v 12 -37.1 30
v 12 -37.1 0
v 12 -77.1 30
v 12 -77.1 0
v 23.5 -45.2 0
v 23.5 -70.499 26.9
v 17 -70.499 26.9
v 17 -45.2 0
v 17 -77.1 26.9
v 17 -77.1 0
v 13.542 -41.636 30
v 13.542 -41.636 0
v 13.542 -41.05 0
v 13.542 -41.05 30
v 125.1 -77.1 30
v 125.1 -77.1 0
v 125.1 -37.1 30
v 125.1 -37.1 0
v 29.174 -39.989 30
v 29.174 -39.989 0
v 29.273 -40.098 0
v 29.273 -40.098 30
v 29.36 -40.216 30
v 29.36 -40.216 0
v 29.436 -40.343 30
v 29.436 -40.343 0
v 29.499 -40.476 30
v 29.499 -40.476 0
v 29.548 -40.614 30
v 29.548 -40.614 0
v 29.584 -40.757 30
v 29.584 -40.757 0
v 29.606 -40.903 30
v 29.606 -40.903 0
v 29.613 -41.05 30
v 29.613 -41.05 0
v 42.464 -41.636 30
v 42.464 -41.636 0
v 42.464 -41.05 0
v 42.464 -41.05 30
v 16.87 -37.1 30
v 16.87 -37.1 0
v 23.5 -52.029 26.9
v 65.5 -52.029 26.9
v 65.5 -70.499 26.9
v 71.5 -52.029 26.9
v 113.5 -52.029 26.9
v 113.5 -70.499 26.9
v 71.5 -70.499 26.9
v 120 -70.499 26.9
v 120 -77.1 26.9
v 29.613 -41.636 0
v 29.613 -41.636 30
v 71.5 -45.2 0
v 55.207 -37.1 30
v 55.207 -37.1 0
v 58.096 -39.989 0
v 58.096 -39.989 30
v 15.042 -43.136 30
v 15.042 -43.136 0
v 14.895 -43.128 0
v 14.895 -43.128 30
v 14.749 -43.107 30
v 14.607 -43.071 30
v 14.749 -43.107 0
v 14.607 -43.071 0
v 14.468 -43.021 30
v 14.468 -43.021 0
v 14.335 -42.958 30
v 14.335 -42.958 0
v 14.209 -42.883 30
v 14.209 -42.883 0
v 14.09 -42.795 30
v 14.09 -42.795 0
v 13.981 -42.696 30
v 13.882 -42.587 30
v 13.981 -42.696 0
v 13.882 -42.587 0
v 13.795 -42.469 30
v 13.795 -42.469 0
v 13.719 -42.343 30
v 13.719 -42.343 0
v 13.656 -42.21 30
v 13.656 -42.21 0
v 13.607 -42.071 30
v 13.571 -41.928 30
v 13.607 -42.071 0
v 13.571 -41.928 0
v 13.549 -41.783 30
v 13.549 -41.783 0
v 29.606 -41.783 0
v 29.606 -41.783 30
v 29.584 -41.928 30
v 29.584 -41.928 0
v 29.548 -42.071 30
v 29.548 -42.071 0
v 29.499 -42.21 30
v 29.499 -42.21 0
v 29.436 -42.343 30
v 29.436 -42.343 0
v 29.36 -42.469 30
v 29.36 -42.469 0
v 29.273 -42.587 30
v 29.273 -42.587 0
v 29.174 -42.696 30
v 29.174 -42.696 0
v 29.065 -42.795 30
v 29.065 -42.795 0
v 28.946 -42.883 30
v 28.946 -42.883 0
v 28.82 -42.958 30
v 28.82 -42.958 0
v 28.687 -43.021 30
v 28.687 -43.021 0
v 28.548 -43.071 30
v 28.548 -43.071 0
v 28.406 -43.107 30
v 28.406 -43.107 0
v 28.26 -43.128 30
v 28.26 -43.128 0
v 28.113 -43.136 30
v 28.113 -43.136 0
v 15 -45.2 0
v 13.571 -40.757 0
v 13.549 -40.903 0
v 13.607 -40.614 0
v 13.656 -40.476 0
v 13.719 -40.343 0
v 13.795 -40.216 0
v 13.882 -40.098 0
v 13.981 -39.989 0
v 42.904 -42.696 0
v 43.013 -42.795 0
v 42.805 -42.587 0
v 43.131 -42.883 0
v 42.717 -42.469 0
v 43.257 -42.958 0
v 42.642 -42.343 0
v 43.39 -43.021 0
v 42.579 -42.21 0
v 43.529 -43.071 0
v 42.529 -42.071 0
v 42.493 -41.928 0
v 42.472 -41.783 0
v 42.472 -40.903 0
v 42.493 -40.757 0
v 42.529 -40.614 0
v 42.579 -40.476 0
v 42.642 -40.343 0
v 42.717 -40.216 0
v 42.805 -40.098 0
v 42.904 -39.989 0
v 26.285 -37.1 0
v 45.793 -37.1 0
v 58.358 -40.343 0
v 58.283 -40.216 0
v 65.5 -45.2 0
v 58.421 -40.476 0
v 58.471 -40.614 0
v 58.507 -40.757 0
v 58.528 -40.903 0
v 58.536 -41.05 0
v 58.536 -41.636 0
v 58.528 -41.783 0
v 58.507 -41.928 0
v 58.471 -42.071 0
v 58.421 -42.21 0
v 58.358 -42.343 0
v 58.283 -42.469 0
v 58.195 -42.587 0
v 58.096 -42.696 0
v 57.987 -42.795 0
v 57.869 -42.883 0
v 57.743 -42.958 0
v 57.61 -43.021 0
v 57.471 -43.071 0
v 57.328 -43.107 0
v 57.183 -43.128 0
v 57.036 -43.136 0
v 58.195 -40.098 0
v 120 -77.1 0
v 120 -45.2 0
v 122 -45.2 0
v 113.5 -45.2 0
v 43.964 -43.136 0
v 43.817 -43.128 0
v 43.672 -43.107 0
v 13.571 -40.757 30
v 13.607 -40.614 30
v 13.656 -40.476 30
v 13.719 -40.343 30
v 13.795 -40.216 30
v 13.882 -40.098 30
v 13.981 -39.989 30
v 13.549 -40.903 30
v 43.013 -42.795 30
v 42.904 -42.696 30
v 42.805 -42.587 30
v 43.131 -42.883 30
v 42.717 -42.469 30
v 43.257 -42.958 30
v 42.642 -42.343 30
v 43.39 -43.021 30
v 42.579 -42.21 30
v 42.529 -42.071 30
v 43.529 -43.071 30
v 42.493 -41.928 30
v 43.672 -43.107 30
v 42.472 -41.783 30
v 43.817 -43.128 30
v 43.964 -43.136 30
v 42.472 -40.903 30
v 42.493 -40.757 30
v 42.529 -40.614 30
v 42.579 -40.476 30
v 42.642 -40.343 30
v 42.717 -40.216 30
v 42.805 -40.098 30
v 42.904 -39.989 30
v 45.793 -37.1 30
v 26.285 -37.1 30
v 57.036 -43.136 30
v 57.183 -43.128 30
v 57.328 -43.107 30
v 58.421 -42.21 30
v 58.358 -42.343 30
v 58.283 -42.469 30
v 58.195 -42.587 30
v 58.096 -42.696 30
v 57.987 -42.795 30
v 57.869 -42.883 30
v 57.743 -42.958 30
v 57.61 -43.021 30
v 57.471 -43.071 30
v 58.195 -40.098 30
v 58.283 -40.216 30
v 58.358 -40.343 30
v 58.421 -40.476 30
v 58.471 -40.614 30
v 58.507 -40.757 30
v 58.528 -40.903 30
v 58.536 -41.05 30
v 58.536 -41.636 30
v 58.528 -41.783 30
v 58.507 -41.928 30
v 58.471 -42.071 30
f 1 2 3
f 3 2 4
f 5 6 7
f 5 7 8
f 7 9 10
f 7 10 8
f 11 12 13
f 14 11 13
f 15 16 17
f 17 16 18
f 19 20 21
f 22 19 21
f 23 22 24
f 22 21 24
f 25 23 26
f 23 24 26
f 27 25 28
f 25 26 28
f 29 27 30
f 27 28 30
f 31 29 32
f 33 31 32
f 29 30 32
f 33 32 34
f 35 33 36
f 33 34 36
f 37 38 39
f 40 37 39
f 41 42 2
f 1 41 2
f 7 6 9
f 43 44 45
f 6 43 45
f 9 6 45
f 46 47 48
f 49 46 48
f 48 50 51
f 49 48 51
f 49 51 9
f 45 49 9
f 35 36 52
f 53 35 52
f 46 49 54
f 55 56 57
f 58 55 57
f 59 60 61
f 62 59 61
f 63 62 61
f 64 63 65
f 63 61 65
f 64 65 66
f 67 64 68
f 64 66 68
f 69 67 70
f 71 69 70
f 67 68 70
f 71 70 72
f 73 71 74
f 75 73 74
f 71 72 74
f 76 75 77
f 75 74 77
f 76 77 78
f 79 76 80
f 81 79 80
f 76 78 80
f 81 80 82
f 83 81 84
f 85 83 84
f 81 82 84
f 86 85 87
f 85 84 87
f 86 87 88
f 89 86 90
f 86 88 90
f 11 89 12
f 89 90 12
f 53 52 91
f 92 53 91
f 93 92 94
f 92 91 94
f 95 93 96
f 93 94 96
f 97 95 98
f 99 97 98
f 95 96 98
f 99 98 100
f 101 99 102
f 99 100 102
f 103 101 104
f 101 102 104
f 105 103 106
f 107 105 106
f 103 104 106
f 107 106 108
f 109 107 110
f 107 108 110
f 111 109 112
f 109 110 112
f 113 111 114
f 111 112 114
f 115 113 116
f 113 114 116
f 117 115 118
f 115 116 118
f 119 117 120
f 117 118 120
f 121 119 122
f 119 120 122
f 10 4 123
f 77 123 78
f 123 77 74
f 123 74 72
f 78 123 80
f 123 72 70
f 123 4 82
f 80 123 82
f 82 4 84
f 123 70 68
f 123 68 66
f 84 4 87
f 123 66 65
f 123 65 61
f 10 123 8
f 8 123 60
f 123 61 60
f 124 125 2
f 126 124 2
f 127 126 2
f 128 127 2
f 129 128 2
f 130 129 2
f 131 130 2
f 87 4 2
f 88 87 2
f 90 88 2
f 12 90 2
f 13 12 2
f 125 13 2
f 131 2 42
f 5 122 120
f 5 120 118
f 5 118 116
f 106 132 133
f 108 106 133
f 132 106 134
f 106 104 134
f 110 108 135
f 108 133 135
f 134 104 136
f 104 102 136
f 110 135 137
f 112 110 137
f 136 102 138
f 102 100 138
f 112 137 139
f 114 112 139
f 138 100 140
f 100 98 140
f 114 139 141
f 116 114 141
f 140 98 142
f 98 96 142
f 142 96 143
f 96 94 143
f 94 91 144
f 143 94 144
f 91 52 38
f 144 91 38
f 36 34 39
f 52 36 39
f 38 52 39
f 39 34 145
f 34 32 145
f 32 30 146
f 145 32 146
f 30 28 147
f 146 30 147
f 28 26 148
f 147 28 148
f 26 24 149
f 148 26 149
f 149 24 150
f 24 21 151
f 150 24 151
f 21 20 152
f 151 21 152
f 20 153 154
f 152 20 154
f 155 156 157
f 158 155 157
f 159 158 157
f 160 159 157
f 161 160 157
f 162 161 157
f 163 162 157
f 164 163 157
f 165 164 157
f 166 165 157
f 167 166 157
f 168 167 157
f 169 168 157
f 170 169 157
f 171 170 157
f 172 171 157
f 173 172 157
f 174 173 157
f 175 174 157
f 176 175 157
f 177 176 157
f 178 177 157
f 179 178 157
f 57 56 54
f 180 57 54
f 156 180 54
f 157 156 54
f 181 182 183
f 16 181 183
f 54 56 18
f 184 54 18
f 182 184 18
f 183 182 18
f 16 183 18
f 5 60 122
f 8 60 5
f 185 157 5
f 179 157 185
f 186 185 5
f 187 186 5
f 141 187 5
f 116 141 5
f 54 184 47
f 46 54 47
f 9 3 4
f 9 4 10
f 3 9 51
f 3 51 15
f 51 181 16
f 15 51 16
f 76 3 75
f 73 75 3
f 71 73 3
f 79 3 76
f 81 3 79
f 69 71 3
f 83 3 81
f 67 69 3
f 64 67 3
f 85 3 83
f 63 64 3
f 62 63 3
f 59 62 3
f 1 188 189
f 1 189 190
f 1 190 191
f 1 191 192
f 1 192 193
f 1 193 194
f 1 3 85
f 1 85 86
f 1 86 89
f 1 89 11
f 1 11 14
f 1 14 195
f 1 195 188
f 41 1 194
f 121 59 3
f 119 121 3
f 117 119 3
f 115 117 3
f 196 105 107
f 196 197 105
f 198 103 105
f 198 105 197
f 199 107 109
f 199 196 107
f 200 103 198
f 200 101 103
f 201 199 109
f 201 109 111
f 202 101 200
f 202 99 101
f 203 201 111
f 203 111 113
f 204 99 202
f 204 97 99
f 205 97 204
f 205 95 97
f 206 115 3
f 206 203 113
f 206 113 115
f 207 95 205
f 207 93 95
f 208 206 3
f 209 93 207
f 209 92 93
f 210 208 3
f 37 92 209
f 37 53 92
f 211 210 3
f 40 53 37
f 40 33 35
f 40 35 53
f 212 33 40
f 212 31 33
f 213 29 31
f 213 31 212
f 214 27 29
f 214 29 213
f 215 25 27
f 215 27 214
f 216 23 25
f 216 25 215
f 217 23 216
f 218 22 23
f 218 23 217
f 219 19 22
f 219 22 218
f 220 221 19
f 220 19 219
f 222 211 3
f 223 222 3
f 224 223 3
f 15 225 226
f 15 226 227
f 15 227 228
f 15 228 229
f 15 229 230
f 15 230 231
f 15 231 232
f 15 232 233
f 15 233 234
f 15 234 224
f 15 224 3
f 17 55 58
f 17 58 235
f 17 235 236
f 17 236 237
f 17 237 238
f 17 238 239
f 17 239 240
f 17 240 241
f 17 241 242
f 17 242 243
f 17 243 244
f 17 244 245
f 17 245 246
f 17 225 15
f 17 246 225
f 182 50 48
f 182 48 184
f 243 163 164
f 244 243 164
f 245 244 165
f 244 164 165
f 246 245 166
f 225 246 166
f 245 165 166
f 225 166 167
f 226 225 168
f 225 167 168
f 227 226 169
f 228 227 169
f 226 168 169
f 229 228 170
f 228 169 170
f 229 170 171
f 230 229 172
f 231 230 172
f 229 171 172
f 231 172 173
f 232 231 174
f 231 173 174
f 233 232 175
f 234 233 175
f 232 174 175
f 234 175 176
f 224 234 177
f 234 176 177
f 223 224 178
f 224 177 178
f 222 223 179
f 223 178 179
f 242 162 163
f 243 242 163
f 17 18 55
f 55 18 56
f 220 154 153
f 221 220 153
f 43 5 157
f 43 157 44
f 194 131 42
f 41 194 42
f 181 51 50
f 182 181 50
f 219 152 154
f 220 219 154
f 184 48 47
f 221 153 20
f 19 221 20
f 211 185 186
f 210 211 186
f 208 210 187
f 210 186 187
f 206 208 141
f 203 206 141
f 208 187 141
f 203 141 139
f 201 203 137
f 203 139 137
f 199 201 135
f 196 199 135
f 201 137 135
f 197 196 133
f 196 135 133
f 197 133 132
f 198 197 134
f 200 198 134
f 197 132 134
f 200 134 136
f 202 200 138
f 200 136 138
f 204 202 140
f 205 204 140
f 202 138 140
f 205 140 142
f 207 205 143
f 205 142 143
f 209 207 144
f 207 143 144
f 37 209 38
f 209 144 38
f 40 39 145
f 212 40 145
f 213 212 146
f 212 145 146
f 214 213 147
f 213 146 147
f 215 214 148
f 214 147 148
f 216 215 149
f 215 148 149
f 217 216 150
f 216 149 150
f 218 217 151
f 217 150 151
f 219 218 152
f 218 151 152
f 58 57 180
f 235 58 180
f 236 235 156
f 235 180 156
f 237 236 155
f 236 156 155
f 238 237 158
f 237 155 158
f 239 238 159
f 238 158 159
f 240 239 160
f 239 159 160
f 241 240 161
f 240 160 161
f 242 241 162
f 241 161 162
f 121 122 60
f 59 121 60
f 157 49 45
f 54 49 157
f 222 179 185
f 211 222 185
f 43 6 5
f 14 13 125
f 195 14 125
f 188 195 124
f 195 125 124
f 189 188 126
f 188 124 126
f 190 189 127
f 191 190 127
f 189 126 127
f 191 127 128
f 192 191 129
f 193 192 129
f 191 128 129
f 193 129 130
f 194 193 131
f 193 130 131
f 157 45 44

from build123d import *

# Parameters (mm, degrees)
F1_DEPTH = 30
F4_DEPTH = 51.5
F5_DEPTH = 53.5
F6_DEPTH = 45
F7_DEPTH = 3


with BuildPart() as f1:
    # F0 (on Top) → F1 (new body)
    with BuildSketch(Plane.XY):
        with BuildLine():
            Line((92.1, -37.1), (90, -37.1))
            Line((90, -37.1), (70.1, -37.1))
            Line((70.1, -37.1), (55.207107, -37.1))
            Line((55.207107, -37.1), (58.096194, -39.989087))
            ThreePointArc((58.096194, -39.989087), (58.421353, -40.475722), (58.535534, -41.049747))
            Line((58.535534, -41.049747), (58.535534, -41.635534))
            ThreePointArc((58.535534, -41.635534), (58.096194, -42.696194), (57.035534, -43.135534))
            Line((57.035534, -43.135534), (43.964466, -43.135534))
            ThreePointArc((43.964466, -43.135534), (42.903806, -42.696194), (42.464466, -41.635534))
            Line((42.464466, -41.635534), (42.464466, -41.049747))
            ThreePointArc((42.464466, -41.049747), (42.578647, -40.475722), (42.903806, -39.989087))
            Line((42.903806, -39.989087), (45.792893, -37.1))
            Line((45.792893, -37.1), (45, -37.1))
            Line((45, -37.1), (26.284599, -37.1))
            Line((26.284599, -37.1), (29.173687, -39.989087))
            ThreePointArc((29.173687, -39.989087), (29.498846, -40.475722), (29.613026, -41.049747))
            Line((29.613026, -41.049747), (29.613026, -41.635534))
            ThreePointArc((29.613026, -41.635534), (29.173687, -42.696194), (28.113026, -43.135534))
            Line((28.113026, -43.135534), (15.041959, -43.135534))
            ThreePointArc((15.041959, -43.135534), (13.981298, -42.696194), (13.541959, -41.635534))
            Line((13.541959, -41.635534), (13.541959, -41.049747))
            ThreePointArc((13.541959, -41.049747), (13.656139, -40.475722), (13.981298, -39.989087))
            Line((13.981298, -39.989087), (16.870386, -37.1))
            Line((16.870386, -37.1), (12, -37.1))
            Line((12, -37.1), (12, -77.1))
            Line((12, -77.1), (125.1, -77.1))
            Line((125.1, -77.1), (125.1, -37.1))
            Line((125.1, -37.1), (92.1, -37.1))
        make_face()
    extrude(amount=F1_DEPTH)

    # F3 (on offset) → F4 (cut, symmetric)
    with BuildSketch(Plane.YZ.offset(68.5)):
        Polygon((-52.029371, 26.9), (-45.2, 0), (-45.2, 26.9), align=None)
        Polygon((-77.2, 0), (-45.2, 0), (-70.498638, 26.9), (-77.2, 26.9), align=None)
        Polygon((-70.498638, 26.9), (-45.2, 0), (-52.029371, 26.9), align=None)
    extrude(amount=F4_DEPTH, both=True, mode=Mode.SUBTRACT)

    # F3 (on offset) → F5 (join, symmetric)
    with BuildSketch(Plane.YZ.offset(68.5)):
        Polygon((-52.029371, 26.9), (-45.2, 0), (-45.2, 26.9), align=None)
        Polygon((-70.498638, 26.9), (-45.2, 0), (-52.029371, 26.9), align=None)
    extrude(amount=F5_DEPTH, both=True)

    # F3 (on offset) → F6 (cut, symmetric)
    with BuildSketch(Plane.YZ.offset(68.5)):
        Polygon((-70.498638, 26.9), (-45.2, 0), (-52.029371, 26.9), align=None)
    extrude(amount=F6_DEPTH, both=True, mode=Mode.SUBTRACT)

    # F3 (on offset) → F7 (join, symmetric)
    with BuildSketch(Plane.YZ.offset(68.5)):
        Polygon((-52.029371, 26.9), (-45.2, 0), (-45.2, 26.9), align=None)
        Polygon((-70.498638, 26.9), (-45.2, 0), (-52.029371, 26.9), align=None)
    extrude(amount=F7_DEPTH, both=True)


solid = f1.part
